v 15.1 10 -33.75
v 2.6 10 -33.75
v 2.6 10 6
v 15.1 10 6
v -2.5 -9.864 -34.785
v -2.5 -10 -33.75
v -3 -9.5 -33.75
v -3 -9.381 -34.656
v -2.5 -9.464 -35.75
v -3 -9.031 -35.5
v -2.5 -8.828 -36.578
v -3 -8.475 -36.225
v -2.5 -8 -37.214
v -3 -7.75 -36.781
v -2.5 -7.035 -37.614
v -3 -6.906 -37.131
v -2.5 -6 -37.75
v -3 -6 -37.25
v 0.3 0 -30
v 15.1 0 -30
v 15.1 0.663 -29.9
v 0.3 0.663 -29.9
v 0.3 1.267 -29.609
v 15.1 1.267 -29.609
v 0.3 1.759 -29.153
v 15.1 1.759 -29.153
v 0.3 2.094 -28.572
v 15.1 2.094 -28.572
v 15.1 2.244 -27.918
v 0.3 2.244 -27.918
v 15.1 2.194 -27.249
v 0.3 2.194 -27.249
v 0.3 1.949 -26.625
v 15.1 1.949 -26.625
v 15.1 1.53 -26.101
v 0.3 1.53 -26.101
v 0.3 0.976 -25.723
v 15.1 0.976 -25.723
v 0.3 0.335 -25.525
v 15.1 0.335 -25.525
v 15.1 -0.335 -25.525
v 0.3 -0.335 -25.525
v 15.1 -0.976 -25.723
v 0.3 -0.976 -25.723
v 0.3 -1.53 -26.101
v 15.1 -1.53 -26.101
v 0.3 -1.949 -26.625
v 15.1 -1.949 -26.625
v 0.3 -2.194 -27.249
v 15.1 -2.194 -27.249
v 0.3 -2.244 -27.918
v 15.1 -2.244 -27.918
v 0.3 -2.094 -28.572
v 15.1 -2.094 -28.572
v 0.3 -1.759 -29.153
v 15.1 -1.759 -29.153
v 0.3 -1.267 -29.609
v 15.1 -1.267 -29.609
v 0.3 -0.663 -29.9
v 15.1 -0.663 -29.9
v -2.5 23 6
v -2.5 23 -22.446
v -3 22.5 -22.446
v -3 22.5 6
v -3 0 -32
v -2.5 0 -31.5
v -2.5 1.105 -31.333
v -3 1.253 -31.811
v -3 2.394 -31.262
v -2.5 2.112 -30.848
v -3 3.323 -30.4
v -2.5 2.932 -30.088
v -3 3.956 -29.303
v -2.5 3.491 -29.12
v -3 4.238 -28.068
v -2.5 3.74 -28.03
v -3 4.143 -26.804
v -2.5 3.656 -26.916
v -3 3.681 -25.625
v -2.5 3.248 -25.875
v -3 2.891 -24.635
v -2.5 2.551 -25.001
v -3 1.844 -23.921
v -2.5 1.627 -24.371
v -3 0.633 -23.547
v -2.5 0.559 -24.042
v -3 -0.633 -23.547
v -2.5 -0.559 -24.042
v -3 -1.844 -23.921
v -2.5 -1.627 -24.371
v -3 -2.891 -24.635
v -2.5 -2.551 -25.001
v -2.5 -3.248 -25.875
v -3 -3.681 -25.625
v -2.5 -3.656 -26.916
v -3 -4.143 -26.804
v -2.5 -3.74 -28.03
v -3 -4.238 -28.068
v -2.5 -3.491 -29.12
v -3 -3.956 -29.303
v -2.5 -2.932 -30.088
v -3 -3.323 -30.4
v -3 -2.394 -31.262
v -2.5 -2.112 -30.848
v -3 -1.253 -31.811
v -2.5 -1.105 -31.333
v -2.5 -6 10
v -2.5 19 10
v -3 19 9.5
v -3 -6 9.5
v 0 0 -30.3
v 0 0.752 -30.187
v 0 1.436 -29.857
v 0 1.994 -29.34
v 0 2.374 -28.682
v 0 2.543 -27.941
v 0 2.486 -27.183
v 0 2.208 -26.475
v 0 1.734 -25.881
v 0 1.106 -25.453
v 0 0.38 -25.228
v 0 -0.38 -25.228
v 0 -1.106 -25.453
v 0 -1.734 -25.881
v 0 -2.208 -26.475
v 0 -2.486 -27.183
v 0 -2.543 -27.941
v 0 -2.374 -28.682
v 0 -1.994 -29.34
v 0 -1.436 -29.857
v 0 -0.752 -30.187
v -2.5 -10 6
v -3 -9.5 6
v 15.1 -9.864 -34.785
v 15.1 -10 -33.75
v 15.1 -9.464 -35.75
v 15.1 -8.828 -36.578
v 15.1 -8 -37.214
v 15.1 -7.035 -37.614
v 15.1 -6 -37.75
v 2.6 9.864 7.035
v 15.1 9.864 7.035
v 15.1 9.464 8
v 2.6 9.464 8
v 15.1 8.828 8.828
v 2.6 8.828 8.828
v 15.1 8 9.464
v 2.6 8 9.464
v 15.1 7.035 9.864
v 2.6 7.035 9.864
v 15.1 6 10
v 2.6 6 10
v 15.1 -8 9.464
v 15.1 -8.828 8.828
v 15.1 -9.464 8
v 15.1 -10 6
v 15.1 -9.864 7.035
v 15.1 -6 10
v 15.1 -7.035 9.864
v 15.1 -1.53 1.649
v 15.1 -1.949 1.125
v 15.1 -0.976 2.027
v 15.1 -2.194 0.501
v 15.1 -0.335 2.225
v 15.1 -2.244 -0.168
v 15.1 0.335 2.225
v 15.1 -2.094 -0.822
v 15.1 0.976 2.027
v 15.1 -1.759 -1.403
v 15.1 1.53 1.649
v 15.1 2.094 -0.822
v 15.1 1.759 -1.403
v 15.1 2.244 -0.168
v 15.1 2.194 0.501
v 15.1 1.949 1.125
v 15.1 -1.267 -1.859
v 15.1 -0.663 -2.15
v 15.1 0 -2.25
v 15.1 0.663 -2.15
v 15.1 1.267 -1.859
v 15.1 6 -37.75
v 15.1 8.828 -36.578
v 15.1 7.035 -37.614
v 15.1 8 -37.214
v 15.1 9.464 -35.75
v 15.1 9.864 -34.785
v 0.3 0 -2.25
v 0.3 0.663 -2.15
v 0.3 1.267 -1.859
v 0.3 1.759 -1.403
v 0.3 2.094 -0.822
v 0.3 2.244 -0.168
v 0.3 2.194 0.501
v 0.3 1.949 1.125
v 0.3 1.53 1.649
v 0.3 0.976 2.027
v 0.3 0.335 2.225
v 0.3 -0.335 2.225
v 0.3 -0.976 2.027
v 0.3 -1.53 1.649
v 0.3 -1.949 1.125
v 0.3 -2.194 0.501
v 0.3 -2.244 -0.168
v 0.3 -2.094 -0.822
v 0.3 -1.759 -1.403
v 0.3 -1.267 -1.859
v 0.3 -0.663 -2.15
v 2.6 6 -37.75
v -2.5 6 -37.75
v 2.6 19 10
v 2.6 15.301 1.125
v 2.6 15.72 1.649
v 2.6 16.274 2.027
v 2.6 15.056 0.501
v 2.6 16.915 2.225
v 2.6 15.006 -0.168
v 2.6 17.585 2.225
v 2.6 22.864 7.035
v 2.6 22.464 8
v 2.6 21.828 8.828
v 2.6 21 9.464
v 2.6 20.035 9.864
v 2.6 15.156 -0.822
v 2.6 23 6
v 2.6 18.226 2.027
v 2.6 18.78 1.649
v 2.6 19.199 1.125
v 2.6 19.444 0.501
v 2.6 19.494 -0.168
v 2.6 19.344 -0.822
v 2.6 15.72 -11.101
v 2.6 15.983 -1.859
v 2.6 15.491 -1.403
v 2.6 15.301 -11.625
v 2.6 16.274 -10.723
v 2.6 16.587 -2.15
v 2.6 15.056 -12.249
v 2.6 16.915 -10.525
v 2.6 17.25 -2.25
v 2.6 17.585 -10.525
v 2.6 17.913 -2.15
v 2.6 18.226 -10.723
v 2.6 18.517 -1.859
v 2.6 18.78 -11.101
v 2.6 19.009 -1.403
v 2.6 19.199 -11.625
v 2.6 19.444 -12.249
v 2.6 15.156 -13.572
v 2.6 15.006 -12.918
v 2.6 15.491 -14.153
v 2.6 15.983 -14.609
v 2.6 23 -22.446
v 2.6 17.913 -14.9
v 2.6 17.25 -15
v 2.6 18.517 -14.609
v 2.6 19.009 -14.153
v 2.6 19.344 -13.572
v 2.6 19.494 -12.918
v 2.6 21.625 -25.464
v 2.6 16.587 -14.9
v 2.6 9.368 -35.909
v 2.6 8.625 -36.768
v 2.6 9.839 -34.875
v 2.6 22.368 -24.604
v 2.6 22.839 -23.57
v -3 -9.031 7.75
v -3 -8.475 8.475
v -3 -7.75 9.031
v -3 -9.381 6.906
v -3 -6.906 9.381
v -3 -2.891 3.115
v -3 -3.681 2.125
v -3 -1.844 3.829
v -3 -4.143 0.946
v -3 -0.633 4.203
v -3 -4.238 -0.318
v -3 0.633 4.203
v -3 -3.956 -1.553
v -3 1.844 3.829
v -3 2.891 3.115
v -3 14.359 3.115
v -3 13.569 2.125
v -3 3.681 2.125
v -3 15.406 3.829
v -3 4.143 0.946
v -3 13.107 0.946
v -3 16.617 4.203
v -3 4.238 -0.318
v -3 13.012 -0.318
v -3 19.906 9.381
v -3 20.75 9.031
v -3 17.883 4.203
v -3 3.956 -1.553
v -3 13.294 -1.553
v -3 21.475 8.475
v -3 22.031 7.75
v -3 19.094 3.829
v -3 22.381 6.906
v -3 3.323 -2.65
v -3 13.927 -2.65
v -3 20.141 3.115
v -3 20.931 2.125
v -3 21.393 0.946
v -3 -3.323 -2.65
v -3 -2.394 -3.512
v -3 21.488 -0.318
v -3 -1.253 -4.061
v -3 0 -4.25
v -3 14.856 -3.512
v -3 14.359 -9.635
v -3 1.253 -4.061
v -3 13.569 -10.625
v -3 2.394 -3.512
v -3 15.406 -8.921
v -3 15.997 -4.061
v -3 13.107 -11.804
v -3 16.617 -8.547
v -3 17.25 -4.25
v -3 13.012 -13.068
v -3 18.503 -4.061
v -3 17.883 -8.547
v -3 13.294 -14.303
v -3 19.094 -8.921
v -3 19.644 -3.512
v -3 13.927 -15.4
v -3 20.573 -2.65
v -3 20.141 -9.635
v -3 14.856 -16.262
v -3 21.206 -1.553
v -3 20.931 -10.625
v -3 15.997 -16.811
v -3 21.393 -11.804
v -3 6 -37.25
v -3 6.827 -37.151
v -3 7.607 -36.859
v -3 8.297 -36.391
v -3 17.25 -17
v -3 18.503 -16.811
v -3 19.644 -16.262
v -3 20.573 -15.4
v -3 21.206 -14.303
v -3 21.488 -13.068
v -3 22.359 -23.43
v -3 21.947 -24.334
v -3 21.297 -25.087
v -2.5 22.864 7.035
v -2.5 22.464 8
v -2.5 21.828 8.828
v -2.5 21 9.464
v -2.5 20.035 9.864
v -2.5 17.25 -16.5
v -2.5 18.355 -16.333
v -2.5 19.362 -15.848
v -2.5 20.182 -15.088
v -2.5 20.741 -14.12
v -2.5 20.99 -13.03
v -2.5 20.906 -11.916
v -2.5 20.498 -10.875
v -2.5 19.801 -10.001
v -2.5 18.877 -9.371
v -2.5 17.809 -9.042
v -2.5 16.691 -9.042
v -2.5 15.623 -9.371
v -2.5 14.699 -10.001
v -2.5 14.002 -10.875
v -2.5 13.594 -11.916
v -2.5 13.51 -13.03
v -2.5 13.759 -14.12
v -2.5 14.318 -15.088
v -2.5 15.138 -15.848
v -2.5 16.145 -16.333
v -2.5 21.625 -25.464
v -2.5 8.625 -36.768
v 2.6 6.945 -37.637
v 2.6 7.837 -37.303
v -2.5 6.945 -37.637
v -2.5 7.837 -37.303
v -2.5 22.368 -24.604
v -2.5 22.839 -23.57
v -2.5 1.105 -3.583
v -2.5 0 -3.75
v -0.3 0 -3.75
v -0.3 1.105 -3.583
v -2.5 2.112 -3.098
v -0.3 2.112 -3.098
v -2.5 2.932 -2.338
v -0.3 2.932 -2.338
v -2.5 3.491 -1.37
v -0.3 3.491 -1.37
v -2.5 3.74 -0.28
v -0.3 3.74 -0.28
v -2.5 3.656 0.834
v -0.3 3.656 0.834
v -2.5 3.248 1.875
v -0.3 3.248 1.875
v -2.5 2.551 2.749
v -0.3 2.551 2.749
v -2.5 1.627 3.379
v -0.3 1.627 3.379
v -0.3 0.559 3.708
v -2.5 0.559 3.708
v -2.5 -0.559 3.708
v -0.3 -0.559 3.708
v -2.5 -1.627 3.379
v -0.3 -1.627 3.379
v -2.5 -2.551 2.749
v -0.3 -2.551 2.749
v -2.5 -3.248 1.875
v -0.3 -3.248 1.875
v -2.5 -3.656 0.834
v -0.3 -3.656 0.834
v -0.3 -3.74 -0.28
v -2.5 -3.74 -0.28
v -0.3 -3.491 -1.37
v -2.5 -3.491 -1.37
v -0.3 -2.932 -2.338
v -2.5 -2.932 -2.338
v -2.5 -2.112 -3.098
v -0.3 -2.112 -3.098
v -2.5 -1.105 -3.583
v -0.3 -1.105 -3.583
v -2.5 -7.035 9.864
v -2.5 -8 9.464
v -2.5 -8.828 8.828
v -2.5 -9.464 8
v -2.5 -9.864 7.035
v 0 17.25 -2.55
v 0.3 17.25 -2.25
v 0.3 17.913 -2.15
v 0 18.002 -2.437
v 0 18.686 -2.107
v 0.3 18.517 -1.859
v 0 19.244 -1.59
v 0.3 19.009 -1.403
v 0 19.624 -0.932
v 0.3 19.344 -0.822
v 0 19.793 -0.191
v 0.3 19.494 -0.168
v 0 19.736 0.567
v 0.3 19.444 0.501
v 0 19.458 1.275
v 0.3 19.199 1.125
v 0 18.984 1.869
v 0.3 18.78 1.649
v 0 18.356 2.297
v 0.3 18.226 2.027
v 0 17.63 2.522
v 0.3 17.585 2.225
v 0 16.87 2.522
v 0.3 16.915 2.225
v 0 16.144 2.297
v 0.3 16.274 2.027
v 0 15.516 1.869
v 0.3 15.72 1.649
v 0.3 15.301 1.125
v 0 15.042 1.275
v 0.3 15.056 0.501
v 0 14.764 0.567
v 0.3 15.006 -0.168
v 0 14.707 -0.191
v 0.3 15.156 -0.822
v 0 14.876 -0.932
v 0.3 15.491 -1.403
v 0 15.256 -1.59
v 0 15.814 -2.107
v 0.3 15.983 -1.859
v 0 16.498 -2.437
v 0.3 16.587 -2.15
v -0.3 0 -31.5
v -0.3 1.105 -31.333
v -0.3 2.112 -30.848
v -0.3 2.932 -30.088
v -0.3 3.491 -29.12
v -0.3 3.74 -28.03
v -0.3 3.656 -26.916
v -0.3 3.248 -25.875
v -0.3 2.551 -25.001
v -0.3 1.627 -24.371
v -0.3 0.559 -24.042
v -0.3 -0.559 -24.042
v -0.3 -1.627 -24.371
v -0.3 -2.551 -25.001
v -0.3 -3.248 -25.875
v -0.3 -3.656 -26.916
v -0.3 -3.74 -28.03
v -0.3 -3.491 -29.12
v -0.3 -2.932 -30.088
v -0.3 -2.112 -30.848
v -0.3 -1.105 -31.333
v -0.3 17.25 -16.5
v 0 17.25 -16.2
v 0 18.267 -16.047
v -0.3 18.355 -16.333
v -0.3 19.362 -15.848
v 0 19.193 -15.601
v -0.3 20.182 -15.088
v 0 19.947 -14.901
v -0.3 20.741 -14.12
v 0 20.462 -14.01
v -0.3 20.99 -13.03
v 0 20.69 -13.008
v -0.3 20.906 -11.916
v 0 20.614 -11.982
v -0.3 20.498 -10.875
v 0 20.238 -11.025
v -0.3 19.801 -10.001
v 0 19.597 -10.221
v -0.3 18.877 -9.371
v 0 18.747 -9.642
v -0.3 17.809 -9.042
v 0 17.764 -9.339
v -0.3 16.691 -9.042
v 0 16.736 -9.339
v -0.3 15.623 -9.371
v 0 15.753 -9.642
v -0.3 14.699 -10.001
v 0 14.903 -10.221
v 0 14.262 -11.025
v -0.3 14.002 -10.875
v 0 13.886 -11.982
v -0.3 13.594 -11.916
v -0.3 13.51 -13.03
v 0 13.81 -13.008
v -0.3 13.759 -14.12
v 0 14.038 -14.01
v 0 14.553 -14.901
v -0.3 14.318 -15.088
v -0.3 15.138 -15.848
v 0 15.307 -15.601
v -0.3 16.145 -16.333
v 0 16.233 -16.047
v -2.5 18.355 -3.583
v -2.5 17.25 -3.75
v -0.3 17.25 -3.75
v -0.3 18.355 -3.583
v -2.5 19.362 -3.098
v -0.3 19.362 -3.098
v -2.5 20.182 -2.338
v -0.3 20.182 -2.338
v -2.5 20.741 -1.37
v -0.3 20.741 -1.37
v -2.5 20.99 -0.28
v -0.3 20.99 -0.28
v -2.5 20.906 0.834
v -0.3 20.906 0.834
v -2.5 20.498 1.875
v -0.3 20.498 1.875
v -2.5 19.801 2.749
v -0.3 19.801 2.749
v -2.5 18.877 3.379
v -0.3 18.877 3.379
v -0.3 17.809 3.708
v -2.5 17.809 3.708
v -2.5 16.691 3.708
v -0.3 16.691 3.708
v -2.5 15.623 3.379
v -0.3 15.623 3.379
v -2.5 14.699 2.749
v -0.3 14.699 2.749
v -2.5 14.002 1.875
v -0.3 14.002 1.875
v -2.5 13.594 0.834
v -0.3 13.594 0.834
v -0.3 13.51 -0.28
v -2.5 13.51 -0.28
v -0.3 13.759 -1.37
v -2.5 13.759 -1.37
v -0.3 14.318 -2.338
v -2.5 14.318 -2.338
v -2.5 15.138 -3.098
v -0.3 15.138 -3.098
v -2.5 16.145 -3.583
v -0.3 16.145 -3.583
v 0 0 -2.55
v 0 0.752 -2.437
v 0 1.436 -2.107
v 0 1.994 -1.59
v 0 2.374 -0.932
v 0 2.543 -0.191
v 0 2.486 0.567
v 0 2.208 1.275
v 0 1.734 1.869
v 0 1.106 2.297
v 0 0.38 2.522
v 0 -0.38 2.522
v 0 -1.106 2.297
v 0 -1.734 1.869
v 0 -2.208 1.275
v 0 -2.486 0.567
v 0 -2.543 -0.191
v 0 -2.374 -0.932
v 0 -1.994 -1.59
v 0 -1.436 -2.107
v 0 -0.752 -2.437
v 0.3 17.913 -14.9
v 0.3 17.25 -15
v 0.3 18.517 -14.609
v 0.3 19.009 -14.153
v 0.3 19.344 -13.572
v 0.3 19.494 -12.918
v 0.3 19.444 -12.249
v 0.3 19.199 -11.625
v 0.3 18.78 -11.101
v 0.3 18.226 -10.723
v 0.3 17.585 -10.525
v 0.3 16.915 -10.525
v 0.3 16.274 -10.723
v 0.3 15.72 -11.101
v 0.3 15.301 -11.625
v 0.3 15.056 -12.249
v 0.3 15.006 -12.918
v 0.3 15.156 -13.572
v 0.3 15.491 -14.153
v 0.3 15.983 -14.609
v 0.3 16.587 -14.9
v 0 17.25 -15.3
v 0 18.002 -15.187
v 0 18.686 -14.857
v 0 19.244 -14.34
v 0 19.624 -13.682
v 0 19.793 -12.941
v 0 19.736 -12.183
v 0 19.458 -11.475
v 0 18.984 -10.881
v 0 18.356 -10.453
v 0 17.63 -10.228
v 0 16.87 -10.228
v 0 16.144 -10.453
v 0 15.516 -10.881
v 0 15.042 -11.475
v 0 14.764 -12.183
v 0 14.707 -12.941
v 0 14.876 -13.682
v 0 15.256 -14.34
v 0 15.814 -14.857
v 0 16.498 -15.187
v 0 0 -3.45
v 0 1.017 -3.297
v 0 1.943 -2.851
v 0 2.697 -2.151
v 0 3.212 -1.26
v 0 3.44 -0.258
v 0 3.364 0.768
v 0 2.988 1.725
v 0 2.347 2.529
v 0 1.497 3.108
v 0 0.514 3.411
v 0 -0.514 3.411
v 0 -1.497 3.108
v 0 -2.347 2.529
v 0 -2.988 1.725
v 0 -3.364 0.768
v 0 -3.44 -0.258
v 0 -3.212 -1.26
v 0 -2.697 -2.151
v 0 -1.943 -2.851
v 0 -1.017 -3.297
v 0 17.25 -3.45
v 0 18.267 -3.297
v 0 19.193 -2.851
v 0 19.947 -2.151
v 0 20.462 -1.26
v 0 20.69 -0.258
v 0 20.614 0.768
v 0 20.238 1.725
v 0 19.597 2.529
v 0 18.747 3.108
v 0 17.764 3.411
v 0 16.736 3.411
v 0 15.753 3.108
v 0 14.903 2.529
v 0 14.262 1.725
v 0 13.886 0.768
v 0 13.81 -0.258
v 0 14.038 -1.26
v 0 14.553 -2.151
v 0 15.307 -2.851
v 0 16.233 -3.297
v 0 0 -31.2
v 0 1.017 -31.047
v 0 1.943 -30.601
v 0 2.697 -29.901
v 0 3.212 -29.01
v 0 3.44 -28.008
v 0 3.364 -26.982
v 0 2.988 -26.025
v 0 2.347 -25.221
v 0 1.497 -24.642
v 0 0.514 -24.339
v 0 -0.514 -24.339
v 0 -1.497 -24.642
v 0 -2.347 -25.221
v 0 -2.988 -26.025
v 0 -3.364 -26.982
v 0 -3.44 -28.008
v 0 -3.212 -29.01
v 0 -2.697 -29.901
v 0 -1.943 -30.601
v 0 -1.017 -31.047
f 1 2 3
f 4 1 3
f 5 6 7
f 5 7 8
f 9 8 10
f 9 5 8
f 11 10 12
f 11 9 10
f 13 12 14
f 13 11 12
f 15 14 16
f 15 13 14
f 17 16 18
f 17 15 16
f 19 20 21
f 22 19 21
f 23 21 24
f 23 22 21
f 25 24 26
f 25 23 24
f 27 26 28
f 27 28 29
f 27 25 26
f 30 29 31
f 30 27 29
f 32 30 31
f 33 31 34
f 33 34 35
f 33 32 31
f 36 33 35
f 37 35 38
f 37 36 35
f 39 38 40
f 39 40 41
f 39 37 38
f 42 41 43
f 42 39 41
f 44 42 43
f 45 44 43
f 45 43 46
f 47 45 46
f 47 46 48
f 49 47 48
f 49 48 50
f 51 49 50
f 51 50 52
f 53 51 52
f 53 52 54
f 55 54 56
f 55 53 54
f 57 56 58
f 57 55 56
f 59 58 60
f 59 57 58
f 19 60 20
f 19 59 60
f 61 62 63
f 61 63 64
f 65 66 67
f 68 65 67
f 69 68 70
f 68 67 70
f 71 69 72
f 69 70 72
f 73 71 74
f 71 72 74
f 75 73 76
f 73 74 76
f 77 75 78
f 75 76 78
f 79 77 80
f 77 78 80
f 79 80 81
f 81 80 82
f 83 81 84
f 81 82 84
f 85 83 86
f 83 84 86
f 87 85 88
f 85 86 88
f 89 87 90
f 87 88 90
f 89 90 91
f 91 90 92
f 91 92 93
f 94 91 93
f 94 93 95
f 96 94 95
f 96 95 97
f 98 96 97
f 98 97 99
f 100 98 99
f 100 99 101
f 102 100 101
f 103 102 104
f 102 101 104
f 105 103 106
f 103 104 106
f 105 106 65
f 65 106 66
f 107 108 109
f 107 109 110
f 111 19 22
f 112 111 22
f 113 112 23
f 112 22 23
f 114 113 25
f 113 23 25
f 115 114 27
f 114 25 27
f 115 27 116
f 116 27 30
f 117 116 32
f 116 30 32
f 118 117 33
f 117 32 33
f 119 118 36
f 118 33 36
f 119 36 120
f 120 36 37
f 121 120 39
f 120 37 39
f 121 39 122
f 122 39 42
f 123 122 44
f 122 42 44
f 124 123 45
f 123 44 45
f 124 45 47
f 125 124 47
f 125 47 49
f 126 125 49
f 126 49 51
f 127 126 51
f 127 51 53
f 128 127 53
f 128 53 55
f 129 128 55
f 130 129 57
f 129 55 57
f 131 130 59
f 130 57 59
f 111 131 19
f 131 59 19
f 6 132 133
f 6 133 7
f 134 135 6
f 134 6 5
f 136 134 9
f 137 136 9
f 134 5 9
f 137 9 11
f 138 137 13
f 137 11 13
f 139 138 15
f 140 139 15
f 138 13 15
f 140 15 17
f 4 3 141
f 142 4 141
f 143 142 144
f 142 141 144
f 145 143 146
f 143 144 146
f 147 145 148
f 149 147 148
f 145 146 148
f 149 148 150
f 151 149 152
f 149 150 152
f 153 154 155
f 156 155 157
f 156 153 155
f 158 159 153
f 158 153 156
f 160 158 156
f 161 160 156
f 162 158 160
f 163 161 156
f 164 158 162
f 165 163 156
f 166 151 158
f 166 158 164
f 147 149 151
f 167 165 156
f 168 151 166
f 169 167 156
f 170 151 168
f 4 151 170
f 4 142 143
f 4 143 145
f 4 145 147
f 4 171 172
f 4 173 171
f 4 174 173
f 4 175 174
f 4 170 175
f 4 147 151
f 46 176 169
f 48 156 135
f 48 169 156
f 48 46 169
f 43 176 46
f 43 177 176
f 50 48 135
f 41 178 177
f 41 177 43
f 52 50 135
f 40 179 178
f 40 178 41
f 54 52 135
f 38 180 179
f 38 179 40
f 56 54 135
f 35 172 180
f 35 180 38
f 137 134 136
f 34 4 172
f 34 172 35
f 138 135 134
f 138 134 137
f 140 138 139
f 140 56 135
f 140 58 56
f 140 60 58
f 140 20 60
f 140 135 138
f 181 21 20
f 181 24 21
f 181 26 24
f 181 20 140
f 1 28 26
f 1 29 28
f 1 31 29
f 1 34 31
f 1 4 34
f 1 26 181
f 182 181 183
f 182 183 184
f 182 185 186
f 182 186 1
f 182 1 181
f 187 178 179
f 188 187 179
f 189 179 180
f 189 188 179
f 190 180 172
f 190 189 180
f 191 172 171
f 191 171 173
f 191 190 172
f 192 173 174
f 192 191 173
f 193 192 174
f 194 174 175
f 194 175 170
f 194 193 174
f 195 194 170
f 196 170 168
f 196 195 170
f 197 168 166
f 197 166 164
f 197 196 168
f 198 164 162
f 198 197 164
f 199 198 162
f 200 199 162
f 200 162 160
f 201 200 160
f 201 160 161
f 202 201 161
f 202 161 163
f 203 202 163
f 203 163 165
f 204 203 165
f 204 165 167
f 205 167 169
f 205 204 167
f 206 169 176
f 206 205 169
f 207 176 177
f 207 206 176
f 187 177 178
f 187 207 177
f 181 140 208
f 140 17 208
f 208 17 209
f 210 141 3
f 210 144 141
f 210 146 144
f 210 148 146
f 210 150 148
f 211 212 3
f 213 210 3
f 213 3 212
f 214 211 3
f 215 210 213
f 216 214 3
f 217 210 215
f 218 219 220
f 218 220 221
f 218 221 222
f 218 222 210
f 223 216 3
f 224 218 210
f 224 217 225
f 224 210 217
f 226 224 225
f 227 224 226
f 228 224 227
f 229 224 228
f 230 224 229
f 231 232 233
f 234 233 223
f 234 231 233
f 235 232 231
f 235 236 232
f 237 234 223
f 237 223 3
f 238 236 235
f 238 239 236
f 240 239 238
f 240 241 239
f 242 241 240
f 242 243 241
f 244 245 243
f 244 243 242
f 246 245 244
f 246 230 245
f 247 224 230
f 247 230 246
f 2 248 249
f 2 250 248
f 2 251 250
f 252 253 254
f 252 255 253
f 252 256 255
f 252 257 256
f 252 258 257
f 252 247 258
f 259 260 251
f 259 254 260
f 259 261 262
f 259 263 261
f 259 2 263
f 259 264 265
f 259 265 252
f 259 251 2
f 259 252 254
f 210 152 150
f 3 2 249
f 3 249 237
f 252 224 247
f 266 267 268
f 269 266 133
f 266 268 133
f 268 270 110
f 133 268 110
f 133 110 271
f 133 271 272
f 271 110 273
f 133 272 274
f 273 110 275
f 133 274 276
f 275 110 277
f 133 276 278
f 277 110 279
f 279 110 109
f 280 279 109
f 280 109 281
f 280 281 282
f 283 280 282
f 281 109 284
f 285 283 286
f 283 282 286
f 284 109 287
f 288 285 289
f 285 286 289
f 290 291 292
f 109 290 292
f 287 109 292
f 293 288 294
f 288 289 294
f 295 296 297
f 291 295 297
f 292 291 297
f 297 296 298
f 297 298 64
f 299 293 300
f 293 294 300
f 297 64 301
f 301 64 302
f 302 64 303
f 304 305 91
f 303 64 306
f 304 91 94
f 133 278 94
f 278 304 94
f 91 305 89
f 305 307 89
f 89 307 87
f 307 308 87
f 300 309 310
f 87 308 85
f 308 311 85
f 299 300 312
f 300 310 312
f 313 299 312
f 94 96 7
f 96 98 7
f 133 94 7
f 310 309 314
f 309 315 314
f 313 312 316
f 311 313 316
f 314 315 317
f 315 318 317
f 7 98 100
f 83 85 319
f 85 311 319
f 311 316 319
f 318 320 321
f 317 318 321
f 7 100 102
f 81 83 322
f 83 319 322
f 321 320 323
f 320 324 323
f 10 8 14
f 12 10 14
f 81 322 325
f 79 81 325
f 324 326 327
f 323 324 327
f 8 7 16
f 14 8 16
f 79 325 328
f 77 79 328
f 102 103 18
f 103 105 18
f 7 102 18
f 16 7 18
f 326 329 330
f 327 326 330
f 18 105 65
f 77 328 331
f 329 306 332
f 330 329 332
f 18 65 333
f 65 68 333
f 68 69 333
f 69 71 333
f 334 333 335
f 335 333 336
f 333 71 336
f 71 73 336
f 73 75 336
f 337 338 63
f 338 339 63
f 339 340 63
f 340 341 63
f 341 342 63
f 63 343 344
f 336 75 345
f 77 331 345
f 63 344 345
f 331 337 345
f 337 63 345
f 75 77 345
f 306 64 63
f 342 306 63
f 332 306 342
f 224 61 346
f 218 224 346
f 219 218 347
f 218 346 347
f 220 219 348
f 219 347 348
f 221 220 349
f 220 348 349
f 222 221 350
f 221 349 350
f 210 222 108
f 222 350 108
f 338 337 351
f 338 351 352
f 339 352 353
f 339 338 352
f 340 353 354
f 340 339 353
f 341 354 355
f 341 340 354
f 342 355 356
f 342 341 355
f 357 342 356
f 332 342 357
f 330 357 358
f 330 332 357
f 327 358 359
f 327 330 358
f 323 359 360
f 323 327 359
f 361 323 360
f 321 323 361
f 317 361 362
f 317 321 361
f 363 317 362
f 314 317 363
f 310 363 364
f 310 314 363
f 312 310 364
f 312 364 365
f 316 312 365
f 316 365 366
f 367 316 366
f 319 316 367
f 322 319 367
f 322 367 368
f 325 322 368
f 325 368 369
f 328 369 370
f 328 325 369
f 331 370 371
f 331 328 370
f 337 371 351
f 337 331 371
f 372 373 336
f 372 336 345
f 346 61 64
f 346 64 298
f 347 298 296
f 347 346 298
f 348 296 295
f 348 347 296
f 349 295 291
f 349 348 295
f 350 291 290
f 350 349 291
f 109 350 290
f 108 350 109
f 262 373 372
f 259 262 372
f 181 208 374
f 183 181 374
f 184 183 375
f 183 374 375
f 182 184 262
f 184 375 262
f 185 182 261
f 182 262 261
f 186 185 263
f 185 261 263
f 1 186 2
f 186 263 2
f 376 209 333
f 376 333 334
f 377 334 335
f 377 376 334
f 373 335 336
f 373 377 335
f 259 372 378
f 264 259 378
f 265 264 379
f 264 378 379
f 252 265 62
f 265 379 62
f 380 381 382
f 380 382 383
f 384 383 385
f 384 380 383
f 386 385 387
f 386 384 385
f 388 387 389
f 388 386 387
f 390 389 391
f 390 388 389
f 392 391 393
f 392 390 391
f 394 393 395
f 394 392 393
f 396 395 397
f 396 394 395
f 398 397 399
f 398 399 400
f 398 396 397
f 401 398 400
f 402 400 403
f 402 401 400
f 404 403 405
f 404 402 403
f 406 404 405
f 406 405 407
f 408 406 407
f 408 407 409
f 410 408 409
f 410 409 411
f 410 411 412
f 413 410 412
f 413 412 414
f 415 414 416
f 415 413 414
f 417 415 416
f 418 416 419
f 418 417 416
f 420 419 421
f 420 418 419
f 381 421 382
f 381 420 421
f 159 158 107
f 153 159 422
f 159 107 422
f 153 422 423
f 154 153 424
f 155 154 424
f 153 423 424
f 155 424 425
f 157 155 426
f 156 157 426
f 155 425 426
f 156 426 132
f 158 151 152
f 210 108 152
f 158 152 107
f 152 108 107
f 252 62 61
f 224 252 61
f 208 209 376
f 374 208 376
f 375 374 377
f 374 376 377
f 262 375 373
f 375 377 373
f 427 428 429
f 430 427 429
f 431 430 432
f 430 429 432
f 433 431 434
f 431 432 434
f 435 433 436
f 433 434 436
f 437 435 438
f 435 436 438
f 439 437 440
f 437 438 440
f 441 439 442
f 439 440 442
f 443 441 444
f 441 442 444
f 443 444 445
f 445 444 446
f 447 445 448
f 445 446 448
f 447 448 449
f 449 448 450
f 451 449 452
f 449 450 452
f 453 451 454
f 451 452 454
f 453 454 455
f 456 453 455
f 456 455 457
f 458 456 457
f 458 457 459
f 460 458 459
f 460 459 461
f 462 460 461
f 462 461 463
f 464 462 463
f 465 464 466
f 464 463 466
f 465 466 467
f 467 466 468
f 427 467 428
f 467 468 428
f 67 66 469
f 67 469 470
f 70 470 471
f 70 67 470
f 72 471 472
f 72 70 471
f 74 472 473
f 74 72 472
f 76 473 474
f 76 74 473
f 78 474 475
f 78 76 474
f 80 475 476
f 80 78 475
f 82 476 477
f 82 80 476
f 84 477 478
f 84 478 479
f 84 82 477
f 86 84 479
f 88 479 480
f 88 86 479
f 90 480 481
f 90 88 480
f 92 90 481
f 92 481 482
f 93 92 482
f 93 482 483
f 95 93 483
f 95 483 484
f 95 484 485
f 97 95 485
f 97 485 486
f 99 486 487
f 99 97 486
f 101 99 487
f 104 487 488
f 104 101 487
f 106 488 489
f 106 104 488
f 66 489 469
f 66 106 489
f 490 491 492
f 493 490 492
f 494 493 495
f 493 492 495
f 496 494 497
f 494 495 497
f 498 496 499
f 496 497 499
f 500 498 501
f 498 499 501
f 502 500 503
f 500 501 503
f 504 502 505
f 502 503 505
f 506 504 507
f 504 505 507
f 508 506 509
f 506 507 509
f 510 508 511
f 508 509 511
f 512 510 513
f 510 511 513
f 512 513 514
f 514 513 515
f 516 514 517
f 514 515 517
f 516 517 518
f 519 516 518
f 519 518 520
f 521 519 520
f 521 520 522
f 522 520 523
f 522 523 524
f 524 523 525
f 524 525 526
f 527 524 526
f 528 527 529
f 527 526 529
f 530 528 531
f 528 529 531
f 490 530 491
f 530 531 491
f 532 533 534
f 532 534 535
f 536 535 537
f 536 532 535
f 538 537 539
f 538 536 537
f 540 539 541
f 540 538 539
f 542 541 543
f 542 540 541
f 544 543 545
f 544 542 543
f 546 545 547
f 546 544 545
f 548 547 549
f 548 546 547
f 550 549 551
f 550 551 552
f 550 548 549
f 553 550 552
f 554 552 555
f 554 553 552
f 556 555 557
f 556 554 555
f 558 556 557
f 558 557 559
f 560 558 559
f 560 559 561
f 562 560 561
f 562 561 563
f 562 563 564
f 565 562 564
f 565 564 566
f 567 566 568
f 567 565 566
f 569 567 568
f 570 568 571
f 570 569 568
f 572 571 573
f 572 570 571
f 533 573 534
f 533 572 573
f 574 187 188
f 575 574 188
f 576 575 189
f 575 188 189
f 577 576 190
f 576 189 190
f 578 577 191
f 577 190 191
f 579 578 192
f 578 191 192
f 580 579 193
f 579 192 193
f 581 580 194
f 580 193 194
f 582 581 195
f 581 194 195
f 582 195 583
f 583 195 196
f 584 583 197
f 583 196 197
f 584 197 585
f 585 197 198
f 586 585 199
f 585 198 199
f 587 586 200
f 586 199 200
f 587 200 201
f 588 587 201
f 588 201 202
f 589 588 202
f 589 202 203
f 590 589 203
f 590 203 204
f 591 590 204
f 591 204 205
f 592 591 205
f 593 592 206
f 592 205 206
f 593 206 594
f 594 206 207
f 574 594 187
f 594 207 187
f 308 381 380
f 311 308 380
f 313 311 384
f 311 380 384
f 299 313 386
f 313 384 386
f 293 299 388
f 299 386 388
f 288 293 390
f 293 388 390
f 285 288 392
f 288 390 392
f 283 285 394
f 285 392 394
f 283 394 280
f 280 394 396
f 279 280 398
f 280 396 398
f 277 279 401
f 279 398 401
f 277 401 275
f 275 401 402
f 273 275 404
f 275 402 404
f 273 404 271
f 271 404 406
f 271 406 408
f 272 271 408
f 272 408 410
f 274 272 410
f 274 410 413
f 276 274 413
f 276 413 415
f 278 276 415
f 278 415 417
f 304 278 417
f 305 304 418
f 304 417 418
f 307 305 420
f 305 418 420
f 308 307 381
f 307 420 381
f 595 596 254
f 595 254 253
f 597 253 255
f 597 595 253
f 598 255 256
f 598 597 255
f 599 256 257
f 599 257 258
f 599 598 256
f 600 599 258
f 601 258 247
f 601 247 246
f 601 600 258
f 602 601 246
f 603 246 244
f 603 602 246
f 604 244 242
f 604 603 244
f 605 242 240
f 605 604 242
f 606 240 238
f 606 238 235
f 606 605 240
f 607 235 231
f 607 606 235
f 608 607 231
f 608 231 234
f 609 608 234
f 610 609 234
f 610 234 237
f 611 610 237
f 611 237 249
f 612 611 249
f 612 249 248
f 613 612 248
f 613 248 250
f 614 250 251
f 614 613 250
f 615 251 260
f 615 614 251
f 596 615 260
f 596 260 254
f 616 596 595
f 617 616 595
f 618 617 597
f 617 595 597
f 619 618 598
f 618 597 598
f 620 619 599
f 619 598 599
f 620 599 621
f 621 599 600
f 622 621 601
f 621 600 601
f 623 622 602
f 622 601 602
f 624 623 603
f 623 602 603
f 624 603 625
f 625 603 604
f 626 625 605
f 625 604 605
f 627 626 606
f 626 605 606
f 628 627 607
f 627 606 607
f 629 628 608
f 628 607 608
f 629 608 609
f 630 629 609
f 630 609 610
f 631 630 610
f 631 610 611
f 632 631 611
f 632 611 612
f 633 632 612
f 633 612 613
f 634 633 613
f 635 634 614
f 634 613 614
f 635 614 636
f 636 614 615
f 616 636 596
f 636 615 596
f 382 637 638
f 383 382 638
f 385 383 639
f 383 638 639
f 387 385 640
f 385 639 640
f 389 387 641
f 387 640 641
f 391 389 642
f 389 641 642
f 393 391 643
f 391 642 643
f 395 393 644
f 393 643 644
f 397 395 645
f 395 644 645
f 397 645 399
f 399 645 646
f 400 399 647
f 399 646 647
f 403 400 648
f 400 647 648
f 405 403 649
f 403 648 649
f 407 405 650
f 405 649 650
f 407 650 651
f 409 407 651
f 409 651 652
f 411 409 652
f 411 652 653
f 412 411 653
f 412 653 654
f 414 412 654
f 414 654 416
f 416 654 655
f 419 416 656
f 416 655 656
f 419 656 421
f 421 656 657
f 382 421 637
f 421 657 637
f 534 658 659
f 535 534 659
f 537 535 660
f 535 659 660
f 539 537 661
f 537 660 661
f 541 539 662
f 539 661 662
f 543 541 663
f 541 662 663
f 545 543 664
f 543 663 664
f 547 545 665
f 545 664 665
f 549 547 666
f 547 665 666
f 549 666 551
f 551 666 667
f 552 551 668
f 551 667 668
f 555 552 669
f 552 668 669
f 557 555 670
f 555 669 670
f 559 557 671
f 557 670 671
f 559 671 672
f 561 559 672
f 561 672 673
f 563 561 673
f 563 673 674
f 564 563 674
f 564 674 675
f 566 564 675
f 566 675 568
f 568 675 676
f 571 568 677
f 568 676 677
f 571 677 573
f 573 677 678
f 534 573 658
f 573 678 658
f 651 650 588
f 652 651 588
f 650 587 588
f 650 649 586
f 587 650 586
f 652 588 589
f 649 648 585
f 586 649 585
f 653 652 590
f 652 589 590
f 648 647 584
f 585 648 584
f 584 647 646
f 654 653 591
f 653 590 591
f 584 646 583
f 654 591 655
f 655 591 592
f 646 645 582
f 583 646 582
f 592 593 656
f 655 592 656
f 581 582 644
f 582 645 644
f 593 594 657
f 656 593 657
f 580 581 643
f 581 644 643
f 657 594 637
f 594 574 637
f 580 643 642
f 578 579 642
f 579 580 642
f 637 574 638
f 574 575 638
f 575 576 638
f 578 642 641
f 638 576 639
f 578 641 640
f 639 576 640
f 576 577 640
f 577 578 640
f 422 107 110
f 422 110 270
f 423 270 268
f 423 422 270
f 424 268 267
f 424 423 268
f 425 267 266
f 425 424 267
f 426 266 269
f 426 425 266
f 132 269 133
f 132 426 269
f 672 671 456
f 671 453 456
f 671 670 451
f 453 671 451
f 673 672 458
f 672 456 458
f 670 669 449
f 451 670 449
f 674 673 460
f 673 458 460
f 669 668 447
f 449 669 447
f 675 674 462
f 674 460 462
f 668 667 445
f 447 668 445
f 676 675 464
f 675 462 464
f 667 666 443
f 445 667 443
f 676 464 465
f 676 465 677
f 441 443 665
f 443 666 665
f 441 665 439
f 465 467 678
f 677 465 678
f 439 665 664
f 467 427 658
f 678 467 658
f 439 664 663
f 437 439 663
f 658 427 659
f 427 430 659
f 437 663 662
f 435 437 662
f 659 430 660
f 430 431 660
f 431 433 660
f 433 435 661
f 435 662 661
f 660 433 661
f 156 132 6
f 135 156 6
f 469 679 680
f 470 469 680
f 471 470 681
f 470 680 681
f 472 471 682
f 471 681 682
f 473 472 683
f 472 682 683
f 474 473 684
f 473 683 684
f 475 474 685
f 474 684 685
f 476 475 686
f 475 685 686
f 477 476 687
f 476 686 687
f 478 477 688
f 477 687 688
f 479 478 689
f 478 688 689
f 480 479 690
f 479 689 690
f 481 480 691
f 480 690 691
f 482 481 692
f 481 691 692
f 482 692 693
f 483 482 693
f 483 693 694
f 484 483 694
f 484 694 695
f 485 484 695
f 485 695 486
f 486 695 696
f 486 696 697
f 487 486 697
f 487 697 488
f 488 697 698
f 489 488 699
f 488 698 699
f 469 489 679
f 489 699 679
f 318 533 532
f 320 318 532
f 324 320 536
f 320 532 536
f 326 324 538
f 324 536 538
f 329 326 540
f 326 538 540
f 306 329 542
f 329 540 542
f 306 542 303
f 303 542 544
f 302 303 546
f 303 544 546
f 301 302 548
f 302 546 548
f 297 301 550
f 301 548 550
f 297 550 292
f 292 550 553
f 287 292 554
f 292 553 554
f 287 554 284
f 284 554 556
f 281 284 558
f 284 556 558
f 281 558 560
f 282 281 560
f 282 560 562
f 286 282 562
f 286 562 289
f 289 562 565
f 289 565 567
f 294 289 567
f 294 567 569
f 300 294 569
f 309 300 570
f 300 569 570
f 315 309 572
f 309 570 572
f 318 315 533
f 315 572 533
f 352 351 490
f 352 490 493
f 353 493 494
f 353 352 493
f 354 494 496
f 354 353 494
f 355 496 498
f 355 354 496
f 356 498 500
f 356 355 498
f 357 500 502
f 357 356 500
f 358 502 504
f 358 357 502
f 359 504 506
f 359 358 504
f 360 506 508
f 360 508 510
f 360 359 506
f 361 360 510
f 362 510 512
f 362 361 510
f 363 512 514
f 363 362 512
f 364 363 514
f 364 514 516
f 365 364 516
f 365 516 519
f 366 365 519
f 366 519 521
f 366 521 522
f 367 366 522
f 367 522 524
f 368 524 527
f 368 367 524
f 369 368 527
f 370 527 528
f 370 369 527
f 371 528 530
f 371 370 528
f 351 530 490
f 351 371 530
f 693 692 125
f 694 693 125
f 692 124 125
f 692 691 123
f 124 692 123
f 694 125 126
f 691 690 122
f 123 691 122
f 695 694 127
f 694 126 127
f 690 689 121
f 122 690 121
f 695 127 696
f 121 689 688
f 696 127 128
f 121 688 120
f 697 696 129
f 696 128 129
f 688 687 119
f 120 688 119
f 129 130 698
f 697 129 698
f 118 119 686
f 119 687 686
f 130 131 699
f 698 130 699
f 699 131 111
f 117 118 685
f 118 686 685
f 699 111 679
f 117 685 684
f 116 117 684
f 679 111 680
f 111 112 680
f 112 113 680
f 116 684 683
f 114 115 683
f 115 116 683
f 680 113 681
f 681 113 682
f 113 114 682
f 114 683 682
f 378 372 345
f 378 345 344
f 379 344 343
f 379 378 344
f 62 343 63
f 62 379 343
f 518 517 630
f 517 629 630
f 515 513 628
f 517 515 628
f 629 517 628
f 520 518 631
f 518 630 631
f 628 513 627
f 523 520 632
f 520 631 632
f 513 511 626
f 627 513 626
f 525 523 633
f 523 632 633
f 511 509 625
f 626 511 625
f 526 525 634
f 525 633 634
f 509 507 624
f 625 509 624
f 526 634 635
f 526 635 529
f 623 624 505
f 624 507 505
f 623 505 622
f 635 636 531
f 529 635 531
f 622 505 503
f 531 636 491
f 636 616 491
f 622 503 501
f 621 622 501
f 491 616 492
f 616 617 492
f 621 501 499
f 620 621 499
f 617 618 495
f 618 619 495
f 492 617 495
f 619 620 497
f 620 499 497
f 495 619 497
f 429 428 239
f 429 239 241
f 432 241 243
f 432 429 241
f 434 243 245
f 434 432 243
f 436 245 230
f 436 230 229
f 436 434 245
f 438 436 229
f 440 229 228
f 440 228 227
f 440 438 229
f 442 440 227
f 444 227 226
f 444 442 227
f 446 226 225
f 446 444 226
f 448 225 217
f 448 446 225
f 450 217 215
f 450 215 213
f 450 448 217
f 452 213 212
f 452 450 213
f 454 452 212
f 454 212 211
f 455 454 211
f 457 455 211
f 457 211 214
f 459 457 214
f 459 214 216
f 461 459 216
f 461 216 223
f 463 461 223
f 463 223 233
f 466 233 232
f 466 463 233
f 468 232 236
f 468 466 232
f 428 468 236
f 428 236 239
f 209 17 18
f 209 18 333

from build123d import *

# Parameters (mm, degrees)
SKETCH1_R           = 2.25
BOSS_EXTRUDE1_DEPTH = 2.6
BOSS_EXTRUDE3_START = -3
SKETCH3_R           = 3.75
BOSS_EXTRUDE3_DEPTH = 3
CHAMFER2_SIZE       = 0.3
CHAMFER3_SIZE       = 0.5
SKETCH4_R           = 2.25
BOSS_EXTRUDE4_DEPTH = 12.5


with BuildPart() as part:
    # Sketch1 → Boss-Extrude1 (new body)
    with BuildSketch(Plane(origin=(0, 0, 0), x_dir=(0, 0, -1), z_dir=(1, 0, 0))):
        with BuildLine():
            Line((-6, -10), (33.75, -10))
            ThreePointArc((33.75, -10), (36.578427125, -8.828427125), (37.75, -6))
            Line((37.75, -6), (37.75, 6))
            ThreePointArc((37.75, 6), (37.496577662, 7.401126626), (36.768422089, 8.62471486))
            Line((36.768422089, 8.62471486), (25.464074263, 21.62471486))
            ThreePointArc((25.464074263, 21.62471486), (24.104136506, 22.63997661), (22.445652174, 23))
            Line((22.445652174, 23), (-6, 23))
            ThreePointArc((-6, 23), (-8.828427125, 21.828427125), (-10, 19))
            Line((-10, 19), (-10, -6))
            ThreePointArc((-10, -6), (-8.828427125, -8.828427125), (-6, -10))
        make_face()
        with Locations((27.75, 0)):
            Circle(SKETCH1_R, mode=Mode.SUBTRACT)
        with Locations((0, 17.25)):
            Circle(SKETCH1_R, mode=Mode.SUBTRACT)
        Circle(SKETCH1_R, mode=Mode.SUBTRACT)
        with Locations((12.75, 17.25)):
            Circle(SKETCH1_R, mode=Mode.SUBTRACT)
    extrude(amount=BOSS_EXTRUDE1_DEPTH)

    # Sketch3 → Boss-Extrude3 (add)
    with BuildSketch(Plane(origin=(0, 0, 0), x_dir=(0, 0, -1), z_dir=(1, 0, 0)).offset(BOSS_EXTRUDE3_START)):
        with BuildLine():
            Line((-6, -10), (33.75, -10))
            ThreePointArc((33.75, -10), (36.578427125, -8.828427125), (37.75, -6))
            Line((37.75, -6), (37.75, 6))
            ThreePointArc((37.75, 6), (37.496577662, 7.401126626), (36.768422089, 8.62471486))
            Line((36.768422089, 8.62471486), (25.464074263, 21.62471486))
            ThreePointArc((25.464074263, 21.62471486), (24.104136506, 22.63997661), (22.445652174, 23))
            Line((22.445652174, 23), (-6, 23))
            ThreePointArc((-6, 23), (-8.828427125, 21.828427125), (-10, 19))
            Line((-10, 19), (-10, -6))
            ThreePointArc((-10, -6), (-8.828427125, -8.828427125), (-6, -10))
        make_face()
        with Locations((27.75, 0)):
            Circle(SKETCH3_R, mode=Mode.SUBTRACT)
        Circle(SKETCH3_R, mode=Mode.SUBTRACT)
        with Locations((0, 17.25)):
            Circle(SKETCH3_R, mode=Mode.SUBTRACT)
        with Locations((12.75, 17.25)):
            Circle(SKETCH3_R, mode=Mode.SUBTRACT)
    extrude(amount=BOSS_EXTRUDE3_DEPTH)

    # Chamfer2
    chamfer2_edges = [part.edges().sort_by_distance(p)[0] for p in [
        (0, 0, -25.5),
        (0, 17.25, 2.25),
        (0, 0, 2.25),
        (0, 17.25, -10.5),
        (0, 0, -24),
        (0, 0, 3.75),
        (0, 17.25, 3.75),
        (0, 17.25, -9),
    ]]
    chamfer(chamfer2_edges, length=CHAMFER2_SIZE)

    # Chamfer3
    chamfer3_edges = [part.edges().sort_by_distance(p)[0] for p in [
        (-3, -8.828427125, 8.828427125),
        (-3, 6.5, 10),
        (-3, 21.828427125, 8.828427125),
        (-3, 23, -8.222826087),
        (-3, 22.63997661, -24.104136506),
        (-3, 15.12471486, -31.116248176),
        (-3, 7.401126626, -37.496577662),
        (-3, 0, -37.75),
        (-3, -8.828427125, -36.578427125),
        (-3, -10, -13.875),
        (-3, 17.25, -9),
        (-3, 17.25, 3.75),
        (-3, 0, 3.75),
        (-3, 0, -24),
    ]]
    chamfer(chamfer3_edges, length=CHAMFER3_SIZE)

    # Sketch4 → Boss-Extrude4 (add)
    with BuildSketch(Plane(origin=(2.6, 0, 0), x_dir=(0, 0, -1), z_dir=(1, 0, 0))):
        with BuildLine():
            Line((-6, -10), (33.75, -10))
            ThreePointArc((33.75, -10), (36.578427125, -8.828427125), (37.75, -6))
            Line((37.75, -6), (37.75, 6))
            ThreePointArc((37.75, 6), (36.578427125, 8.828427125), (33.75, 10))
            Line((33.75, 10), (-6, 10))
            ThreePointArc((-6, 10), (-8.828427125, 8.828427125), (-10, 6))
            Line((-10, 6), (-10, -6))
            ThreePointArc((-10, -6), (-8.828427125, -8.828427125), (-6, -10))
        make_face()
        Circle(SKETCH4_R, mode=Mode.SUBTRACT)
        with Locations((27.75, 0)):
            Circle(SKETCH4_R, mode=Mode.SUBTRACT)
    extrude(amount=BOSS_EXTRUDE4_DEPTH)


solid = part.part
